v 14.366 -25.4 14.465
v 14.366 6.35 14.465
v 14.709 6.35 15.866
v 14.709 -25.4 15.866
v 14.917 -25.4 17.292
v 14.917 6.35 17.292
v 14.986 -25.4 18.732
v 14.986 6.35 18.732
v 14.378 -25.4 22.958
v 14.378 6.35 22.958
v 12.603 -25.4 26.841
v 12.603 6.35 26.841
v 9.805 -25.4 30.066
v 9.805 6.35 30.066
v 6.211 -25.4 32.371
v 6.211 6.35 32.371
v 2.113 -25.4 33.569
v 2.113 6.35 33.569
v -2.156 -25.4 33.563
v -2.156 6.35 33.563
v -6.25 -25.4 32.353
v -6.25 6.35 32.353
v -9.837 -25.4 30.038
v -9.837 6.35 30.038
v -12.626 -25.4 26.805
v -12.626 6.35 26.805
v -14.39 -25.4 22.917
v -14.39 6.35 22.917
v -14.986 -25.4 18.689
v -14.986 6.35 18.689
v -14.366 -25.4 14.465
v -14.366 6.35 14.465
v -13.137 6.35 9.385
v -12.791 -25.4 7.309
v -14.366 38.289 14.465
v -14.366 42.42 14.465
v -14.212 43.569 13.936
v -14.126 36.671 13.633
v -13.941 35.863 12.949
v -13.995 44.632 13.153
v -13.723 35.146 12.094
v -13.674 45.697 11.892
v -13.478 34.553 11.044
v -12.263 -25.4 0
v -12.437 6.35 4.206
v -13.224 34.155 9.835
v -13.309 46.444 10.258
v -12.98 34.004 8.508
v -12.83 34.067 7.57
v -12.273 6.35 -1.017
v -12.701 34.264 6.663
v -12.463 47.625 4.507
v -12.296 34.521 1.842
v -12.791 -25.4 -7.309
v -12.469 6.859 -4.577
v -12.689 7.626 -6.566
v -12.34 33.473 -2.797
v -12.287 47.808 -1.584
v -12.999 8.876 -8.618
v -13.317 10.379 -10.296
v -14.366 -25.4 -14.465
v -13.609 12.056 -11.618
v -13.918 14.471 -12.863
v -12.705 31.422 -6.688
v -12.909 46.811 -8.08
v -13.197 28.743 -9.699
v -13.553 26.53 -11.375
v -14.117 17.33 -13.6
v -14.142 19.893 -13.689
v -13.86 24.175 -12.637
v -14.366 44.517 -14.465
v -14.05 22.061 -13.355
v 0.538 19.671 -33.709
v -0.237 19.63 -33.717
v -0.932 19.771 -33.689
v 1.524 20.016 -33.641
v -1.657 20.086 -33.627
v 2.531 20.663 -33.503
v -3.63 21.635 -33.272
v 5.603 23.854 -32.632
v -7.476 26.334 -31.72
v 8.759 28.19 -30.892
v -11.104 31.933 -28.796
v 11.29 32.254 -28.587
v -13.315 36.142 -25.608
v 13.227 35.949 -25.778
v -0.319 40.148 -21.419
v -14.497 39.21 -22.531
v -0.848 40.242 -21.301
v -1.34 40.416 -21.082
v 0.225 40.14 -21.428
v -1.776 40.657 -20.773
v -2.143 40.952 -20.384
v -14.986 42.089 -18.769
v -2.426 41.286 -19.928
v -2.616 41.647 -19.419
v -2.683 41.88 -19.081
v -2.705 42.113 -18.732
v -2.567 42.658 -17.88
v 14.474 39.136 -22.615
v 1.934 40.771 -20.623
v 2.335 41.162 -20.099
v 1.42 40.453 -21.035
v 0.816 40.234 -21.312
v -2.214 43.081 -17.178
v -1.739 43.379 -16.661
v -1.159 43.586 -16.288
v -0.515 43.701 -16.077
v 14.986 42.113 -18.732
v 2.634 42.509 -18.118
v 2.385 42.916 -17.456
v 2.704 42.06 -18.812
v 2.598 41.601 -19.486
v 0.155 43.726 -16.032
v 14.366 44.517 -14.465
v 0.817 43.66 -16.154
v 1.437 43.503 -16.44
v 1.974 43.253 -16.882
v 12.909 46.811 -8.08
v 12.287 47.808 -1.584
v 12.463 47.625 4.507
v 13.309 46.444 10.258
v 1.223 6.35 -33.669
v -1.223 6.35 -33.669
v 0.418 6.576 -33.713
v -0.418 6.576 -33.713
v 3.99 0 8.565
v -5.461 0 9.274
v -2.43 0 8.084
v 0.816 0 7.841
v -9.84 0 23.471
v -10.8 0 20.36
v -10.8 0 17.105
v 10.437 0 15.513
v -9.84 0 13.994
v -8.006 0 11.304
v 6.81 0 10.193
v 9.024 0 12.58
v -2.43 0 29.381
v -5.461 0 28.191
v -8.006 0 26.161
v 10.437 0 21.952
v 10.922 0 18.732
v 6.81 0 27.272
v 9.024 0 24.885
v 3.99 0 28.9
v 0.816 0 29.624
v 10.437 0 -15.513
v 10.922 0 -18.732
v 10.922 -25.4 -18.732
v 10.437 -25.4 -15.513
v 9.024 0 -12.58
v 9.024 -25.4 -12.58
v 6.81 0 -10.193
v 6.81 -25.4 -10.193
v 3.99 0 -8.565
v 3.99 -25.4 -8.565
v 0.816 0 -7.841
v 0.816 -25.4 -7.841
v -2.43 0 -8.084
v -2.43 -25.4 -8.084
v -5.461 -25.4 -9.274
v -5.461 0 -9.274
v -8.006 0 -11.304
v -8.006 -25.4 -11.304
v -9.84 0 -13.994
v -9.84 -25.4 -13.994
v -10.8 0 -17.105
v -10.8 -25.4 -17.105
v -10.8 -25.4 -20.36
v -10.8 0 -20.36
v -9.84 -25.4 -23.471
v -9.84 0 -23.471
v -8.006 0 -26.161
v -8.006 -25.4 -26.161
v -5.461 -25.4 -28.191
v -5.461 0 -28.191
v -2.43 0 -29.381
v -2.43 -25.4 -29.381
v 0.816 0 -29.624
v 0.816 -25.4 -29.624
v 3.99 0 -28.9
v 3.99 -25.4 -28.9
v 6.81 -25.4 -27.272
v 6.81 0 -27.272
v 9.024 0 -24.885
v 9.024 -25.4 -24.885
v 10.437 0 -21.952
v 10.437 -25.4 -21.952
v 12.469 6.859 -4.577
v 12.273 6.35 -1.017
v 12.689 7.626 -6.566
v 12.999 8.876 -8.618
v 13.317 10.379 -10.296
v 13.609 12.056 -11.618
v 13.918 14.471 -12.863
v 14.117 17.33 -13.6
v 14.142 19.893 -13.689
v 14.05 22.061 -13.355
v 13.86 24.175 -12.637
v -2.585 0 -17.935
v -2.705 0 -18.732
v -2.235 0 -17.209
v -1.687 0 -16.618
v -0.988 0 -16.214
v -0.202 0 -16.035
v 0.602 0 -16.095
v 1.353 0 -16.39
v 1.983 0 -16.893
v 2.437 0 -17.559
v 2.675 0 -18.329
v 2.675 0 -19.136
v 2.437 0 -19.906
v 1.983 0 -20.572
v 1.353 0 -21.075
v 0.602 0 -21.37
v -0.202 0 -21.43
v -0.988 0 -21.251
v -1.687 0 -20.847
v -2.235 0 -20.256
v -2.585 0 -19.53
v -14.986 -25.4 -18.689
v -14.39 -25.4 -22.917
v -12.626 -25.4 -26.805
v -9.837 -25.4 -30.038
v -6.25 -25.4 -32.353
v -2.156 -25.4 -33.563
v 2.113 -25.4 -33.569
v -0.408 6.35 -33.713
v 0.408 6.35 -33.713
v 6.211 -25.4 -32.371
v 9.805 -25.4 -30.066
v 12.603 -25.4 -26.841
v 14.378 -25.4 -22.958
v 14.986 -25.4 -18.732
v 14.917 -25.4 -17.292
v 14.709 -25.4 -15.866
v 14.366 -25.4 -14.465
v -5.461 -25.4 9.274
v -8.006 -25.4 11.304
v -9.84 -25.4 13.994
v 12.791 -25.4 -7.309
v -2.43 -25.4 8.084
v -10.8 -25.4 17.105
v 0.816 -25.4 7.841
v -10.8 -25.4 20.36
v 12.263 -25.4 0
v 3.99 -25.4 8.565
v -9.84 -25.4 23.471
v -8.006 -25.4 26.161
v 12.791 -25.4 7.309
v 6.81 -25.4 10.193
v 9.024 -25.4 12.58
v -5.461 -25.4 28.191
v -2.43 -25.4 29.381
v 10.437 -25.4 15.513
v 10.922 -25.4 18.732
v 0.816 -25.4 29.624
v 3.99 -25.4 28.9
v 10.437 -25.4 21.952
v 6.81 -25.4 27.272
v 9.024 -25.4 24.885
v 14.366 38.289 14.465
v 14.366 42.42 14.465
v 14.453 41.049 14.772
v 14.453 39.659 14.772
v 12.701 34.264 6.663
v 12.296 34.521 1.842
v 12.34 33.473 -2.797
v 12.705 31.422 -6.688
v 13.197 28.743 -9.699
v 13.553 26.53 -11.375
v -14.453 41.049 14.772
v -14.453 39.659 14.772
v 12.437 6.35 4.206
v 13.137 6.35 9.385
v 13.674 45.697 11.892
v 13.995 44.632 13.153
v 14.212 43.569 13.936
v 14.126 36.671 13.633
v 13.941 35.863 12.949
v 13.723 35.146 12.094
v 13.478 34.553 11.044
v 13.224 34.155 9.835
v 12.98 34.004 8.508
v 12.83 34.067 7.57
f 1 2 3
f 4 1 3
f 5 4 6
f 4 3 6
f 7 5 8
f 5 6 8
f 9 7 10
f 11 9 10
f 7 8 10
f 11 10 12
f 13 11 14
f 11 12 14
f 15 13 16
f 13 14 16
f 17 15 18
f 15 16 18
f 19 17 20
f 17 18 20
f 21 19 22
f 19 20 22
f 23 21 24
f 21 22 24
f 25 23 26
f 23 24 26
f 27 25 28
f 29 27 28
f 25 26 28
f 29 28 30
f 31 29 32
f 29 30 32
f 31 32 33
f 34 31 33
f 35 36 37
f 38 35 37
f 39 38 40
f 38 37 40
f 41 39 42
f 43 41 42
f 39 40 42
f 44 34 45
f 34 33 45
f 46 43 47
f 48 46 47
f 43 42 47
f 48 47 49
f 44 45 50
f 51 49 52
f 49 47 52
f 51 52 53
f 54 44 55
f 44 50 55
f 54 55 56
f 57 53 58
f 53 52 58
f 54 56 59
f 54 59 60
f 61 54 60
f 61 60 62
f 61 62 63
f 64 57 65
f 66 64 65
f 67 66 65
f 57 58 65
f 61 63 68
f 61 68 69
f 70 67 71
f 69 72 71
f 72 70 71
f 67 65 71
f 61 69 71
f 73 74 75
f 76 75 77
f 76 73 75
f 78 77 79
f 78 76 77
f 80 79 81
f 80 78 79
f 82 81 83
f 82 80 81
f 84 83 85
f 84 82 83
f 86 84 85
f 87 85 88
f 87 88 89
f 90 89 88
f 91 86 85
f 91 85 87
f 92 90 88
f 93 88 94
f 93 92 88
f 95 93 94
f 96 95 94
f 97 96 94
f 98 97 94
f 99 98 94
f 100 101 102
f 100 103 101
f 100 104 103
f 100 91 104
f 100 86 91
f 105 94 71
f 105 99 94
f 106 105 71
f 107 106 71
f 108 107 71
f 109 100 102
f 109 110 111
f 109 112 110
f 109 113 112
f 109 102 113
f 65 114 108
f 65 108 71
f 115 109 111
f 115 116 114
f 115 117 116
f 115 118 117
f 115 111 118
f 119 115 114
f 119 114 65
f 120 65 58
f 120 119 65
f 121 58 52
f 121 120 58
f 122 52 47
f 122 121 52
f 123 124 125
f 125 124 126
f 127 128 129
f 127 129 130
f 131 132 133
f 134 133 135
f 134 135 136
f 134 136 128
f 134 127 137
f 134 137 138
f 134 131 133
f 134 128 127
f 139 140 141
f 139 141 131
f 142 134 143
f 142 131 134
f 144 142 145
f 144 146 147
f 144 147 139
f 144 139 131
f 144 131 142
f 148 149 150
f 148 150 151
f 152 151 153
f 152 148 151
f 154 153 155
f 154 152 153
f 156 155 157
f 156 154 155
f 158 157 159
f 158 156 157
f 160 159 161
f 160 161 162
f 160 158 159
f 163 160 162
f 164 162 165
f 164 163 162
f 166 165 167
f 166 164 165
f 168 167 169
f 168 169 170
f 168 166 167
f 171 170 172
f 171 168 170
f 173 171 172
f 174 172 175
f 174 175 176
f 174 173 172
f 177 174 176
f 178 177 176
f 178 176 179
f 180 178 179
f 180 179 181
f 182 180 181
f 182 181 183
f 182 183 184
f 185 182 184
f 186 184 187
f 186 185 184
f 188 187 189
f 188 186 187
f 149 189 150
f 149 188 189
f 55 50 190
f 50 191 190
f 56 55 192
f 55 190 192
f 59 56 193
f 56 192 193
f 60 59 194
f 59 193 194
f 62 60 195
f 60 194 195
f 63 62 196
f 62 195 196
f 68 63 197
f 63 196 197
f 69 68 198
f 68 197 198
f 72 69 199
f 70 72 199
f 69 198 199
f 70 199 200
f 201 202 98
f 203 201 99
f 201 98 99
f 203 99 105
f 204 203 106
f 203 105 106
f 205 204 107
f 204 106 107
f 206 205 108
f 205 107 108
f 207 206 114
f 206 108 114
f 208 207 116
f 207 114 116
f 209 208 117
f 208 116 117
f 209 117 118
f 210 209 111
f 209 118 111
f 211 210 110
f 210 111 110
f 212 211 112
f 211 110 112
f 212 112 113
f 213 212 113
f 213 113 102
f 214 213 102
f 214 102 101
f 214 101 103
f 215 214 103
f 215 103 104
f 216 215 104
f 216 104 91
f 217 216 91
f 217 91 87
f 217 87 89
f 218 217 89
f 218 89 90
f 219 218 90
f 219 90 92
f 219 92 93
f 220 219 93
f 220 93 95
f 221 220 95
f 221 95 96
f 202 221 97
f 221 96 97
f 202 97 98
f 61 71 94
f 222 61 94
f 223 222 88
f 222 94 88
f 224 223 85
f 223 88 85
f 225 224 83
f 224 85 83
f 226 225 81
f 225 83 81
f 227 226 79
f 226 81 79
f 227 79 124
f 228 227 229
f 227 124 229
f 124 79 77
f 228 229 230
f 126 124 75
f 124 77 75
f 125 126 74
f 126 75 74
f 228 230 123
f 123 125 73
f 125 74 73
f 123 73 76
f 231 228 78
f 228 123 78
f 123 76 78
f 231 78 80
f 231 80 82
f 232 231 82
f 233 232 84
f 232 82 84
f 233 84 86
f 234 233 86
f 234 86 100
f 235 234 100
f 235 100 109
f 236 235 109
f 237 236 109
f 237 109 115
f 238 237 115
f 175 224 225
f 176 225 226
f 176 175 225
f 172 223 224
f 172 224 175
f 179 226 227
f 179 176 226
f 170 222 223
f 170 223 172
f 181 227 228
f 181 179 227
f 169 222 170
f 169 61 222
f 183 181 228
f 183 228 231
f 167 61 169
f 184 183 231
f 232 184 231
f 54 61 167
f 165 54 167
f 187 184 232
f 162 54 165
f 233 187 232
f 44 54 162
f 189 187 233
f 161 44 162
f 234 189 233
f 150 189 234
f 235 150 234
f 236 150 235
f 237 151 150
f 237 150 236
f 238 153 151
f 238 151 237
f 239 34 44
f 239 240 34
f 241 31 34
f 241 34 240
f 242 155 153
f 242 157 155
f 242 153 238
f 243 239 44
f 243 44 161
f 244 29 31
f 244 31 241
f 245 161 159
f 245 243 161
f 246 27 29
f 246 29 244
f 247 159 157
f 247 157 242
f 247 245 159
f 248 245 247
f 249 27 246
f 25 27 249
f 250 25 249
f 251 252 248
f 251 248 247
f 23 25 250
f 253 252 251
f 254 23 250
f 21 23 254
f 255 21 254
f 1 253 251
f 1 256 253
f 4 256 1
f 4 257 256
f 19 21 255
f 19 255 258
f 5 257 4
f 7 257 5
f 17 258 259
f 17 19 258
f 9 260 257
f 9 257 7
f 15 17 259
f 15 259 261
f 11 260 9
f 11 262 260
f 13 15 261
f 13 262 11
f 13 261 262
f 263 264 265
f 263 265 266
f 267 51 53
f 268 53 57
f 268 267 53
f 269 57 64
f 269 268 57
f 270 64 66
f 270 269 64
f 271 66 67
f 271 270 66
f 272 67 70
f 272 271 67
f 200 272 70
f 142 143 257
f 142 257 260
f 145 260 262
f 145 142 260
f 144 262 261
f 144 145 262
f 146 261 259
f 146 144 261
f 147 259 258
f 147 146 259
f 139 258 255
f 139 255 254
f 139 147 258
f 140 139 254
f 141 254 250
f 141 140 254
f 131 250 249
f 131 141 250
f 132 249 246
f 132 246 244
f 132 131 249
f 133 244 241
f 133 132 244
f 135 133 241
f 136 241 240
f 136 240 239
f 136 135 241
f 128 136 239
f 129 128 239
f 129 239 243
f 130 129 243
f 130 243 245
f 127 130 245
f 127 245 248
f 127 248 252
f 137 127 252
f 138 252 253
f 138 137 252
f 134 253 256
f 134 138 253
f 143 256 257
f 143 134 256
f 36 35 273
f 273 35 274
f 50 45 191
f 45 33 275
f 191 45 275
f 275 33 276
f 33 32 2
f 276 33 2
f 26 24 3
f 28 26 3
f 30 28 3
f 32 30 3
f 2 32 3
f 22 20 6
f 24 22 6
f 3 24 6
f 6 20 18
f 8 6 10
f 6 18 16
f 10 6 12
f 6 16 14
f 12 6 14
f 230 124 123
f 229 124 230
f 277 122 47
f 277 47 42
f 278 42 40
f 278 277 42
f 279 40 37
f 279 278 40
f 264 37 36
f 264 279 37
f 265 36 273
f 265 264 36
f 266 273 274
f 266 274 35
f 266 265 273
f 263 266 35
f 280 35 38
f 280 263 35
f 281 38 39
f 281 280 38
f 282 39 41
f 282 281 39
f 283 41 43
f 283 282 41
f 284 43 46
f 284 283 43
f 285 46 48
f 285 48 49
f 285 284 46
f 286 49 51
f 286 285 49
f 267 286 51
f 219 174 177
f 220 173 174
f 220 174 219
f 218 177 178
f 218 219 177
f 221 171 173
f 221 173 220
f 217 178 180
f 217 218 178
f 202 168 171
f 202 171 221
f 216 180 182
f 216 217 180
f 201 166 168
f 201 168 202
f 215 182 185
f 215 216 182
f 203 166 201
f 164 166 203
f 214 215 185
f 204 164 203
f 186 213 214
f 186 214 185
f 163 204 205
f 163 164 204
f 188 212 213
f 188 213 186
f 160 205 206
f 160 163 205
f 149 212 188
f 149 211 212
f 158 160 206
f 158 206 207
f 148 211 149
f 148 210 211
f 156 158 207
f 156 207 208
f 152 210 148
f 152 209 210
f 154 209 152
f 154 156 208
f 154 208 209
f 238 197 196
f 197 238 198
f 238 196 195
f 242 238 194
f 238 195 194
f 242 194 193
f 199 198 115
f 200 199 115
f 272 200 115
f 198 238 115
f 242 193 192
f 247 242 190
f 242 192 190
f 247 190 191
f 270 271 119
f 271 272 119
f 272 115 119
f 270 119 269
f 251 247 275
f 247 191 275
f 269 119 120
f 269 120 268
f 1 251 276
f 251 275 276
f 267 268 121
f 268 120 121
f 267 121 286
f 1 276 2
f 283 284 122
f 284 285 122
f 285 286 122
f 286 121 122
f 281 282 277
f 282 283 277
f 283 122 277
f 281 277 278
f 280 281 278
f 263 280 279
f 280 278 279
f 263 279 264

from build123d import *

# Parameters (mm, degrees)
F0_R     = 10.922
F1_DEPTH = 25.4
F2_DEPTH = 6.35
F4_DEPTH = 25.4
F5_DEPTH = 76.2
F6_DEPTH = 25.4
F7_D     = 5.4102
F8_R     = 12.7


with BuildPart() as f1:
    # F0 (on Front) → F1 (new body)
    with BuildSketch(Plane.XZ):
        with BuildLine():
            ThreePointArc((14.3656110791, 14.4652509653), (0, 3.7465), (-14.3656110791, 14.4652509653))
            ThreePointArc((-14.3656110791, 14.4652509653), (-12.2625977878, 0), (-14.3656110791, -14.4652509653))
            ThreePointArc((-14.3656110791, -14.4652509653), (0, -3.7465), (14.3656110791, -14.4652509653))
            ThreePointArc((14.3656110791, -14.4652509653), (12.2625977878, 0), (14.3656110791, 14.4652509653))
        make_face()
        with BuildLine():
            ThreePointArc((14.3656110791, 14.4652509653), (14.8300917669, 16.5764447631), (14.986, 18.7325))
            ThreePointArc((14.986, 18.7325), (-2.1560552369, 33.5625917669), (-14.3656110791, 14.4652509653))
            ThreePointArc((-14.3656110791, 14.4652509653), (0, 3.7465), (14.3656110791, 14.4652509653))
        make_face()
        with Locations((0, 18.7325)):
            Circle(F0_R, mode=Mode.SUBTRACT)
        with BuildLine():
            ThreePointArc((14.3656110791, -14.4652509653), (0, -3.7465), (-14.3656110791, -14.4652509653))
            ThreePointArc((-14.3656110791, -14.4652509653), (-2.1560552369, -33.5625917669), (14.986, -18.7325))
            ThreePointArc((14.986, -18.7325), (14.8300917669, -16.5764447631), (14.3656110791, -14.4652509653))
        make_face()
        with Locations((0, -18.7325)):
            Circle(F0_R, mode=Mode.SUBTRACT)
    extrude(amount=F1_DEPTH)

    # F0 (on Front) → F2 (join)
    with BuildSketch(Plane.XZ):
        with BuildLine():
            ThreePointArc((14.3656110791, 14.4652509653), (14.8300917669, 16.5764447631), (14.986, 18.7325))
            ThreePointArc((14.986, 18.7325), (-2.1560552369, 33.5625917669), (-14.3656110791, 14.4652509653))
            ThreePointArc((-14.3656110791, 14.4652509653), (0, 3.7465), (14.3656110791, 14.4652509653))
        make_face()
        with Locations((0, 18.7325)):
            Circle(F0_R, mode=Mode.SUBTRACT)
        with BuildLine():
            ThreePointArc((14.3656110791, 14.4652509653), (0, 3.7465), (-14.3656110791, 14.4652509653))
            ThreePointArc((-14.3656110791, 14.4652509653), (-12.2625977878, 0), (-14.3656110791, -14.4652509653))
            ThreePointArc((-14.3656110791, -14.4652509653), (0, -3.7465), (14.3656110791, -14.4652509653))
            ThreePointArc((14.3656110791, -14.4652509653), (12.2625977878, 0), (14.3656110791, 14.4652509653))
        make_face()
        with BuildLine():
            ThreePointArc((14.3656110791, -14.4652509653), (0, -3.7465), (-14.3656110791, -14.4652509653))
            ThreePointArc((-14.3656110791, -14.4652509653), (-2.1560552369, -33.5625917669), (14.986, -18.7325))
            ThreePointArc((14.986, -18.7325), (14.8300917669, -16.5764447631), (14.3656110791, -14.4652509653))
        make_face()
        with Locations((0, -18.7325)):
            Circle(F0_R, mode=Mode.SUBTRACT)
        with Locations((0, 18.7325)):
            Circle(F0_R)
        with Locations((0, -18.7325)):
            Circle(F0_R)
    extrude(amount=-F2_DEPTH)

    # F3 (on Right) → F4 (join, symmetric)
    with BuildSketch(Plane.YZ):
        with BuildLine():
            Line((0, 0), (6.35, -33.6685143411))
            ThreePointArc((6.35, -33.6685143411), (38.7816728167, -23.0090487153), (46.444249479, 10.2583907415))
            ThreePointArc((46.444249479, 10.2583907415), (38.5562501556, 14.5507638234), (34.2638770738, 6.6627644999))
            ThreePointArc((34.2638770738, 6.6627644999), (20.4633207868, -13.8005562869), (0, 0))
        make_face()
    extrude(amount=F4_DEPTH, both=True)

    # F0 (on Front) → F5 (intersect)
    with BuildSketch(Plane.XZ):
        with BuildLine():
            ThreePointArc((14.3656110791, 14.4652509653), (14.8300917669, 16.5764447631), (14.986, 18.7325))
            ThreePointArc((14.986, 18.7325), (-2.1560552369, 33.5625917669), (-14.3656110791, 14.4652509653))
            ThreePointArc((-14.3656110791, 14.4652509653), (0, 3.7465), (14.3656110791, 14.4652509653))
        make_face()
        with Locations((0, 18.7325)):
            Circle(F0_R, mode=Mode.SUBTRACT)
        with BuildLine():
            ThreePointArc((14.3656110791, 14.4652509653), (0, 3.7465), (-14.3656110791, 14.4652509653))
            ThreePointArc((-14.3656110791, 14.4652509653), (-12.2625977878, 0), (-14.3656110791, -14.4652509653))
            ThreePointArc((-14.3656110791, -14.4652509653), (0, -3.7465), (14.3656110791, -14.4652509653))
            ThreePointArc((14.3656110791, -14.4652509653), (12.2625977878, 0), (14.3656110791, 14.4652509653))
        make_face()
        with BuildLine():
            ThreePointArc((14.3656110791, -14.4652509653), (0, -3.7465), (-14.3656110791, -14.4652509653))
            ThreePointArc((-14.3656110791, -14.4652509653), (-2.1560552369, -33.5625917669), (14.986, -18.7325))
            ThreePointArc((14.986, -18.7325), (14.8300917669, -16.5764447631), (14.3656110791, -14.4652509653))
        make_face()
        with Locations((0, -18.7325)):
            Circle(F0_R, mode=Mode.SUBTRACT)
        with Locations((0, -18.7325)):
            Circle(F0_R)
        with Locations((0, 18.7325)):
            Circle(F0_R)
    extrude(amount=-F5_DEPTH, mode=Mode.INTERSECT)

    # F0 (on Front) → F6 (join)
    with BuildSketch(Plane.XZ):
        with BuildLine():
            ThreePointArc((14.3656110791, 14.4652509653), (14.8300917669, 16.5764447631), (14.986, 18.7325))
            ThreePointArc((14.986, 18.7325), (-2.1560552369, 33.5625917669), (-14.3656110791, 14.4652509653))
            ThreePointArc((-14.3656110791, 14.4652509653), (0, 3.7465), (14.3656110791, 14.4652509653))
        make_face()
        with Locations((0, 18.7325)):
            Circle(F0_R, mode=Mode.SUBTRACT)
        with BuildLine():
            ThreePointArc((14.3656110791, 14.4652509653), (0, 3.7465), (-14.3656110791, 14.4652509653))
            ThreePointArc((-14.3656110791, 14.4652509653), (-12.2625977878, 0), (-14.3656110791, -14.4652509653))
            ThreePointArc((-14.3656110791, -14.4652509653), (0, -3.7465), (14.3656110791, -14.4652509653))
            ThreePointArc((14.3656110791, -14.4652509653), (12.2625977878, 0), (14.3656110791, 14.4652509653))
        make_face()
        with BuildLine():
            ThreePointArc((14.3656110791, -14.4652509653), (0, -3.7465), (-14.3656110791, -14.4652509653))
            ThreePointArc((-14.3656110791, -14.4652509653), (-2.1560552369, -33.5625917669), (14.986, -18.7325))
            ThreePointArc((14.986, -18.7325), (14.8300917669, -16.5764447631), (14.3656110791, -14.4652509653))
        make_face()
        with Locations((0, -18.7325)):
            Circle(F0_R, mode=Mode.SUBTRACT)
    extrude(amount=F6_DEPTH)

    # F7 (through all)
    with Locations(Plane.XZ):
        with Locations((0, -18.7325)):
            Hole(F7_D / 2)

    # F8
    f8_edges = [f1.edges().sort_by_distance(p)[0] for p in [
        (0, 6.35, -10.392729),
    ]]
    fillet(f8_edges, radius=F8_R)


solid = f1.part
